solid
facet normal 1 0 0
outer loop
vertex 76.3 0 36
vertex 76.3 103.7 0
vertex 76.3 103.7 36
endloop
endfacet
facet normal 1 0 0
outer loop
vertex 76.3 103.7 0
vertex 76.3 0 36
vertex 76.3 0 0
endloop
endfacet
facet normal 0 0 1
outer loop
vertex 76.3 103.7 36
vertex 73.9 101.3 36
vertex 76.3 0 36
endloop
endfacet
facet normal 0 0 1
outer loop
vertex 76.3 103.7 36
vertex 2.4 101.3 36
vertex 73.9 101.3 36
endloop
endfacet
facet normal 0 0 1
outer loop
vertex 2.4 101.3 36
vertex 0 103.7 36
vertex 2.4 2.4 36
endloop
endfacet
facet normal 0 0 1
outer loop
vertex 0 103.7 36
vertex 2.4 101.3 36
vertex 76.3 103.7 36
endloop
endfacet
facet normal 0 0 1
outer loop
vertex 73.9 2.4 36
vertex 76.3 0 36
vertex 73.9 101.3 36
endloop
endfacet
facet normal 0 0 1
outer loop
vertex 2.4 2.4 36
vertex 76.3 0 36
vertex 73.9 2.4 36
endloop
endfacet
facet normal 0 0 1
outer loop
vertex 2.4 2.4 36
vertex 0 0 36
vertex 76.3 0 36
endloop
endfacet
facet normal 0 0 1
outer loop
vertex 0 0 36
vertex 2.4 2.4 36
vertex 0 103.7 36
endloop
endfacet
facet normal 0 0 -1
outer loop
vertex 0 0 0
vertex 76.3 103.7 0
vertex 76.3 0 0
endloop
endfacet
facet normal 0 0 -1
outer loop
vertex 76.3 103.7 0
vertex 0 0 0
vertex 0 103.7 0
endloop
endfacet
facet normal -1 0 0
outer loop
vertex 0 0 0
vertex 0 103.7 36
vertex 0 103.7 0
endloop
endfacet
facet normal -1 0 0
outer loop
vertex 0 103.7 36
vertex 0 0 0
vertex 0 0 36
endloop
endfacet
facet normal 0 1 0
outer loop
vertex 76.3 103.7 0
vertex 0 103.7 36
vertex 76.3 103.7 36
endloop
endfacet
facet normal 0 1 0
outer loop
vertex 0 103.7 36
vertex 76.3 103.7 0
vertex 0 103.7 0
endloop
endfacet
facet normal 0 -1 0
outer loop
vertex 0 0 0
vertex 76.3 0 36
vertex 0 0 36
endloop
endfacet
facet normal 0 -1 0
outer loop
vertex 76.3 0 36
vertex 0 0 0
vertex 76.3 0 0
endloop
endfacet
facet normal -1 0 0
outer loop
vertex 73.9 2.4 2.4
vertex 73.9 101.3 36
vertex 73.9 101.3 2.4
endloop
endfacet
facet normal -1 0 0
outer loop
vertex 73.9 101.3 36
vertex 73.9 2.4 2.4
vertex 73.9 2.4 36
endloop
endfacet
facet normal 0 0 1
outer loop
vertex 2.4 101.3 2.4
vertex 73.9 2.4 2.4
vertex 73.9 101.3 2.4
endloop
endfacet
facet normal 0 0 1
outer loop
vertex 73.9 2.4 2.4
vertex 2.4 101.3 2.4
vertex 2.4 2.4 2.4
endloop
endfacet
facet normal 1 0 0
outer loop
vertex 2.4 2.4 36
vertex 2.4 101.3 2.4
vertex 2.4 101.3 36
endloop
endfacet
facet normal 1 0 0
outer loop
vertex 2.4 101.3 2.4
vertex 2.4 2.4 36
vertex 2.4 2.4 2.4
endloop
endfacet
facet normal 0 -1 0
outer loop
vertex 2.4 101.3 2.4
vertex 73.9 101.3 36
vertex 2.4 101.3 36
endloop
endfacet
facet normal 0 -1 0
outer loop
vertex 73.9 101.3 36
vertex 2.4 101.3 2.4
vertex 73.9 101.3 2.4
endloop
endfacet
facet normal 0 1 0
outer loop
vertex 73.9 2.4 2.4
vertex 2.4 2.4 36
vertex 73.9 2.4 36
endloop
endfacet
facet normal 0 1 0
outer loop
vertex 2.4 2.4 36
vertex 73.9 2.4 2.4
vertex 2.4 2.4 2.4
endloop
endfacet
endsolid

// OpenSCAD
// Drop-in muck trough. Poker card ~63.5 x 88.9 mm. OpenSCAD.
card_w = 63.5;
card_h = 88.9;
wall = 2.4;
n = 80;
// stack height rough 0.3mm * n
H = 0.3 * n + 12;
W = card_w + 8;
D = card_h + 10;
difference() {
  cube([W + 2*wall, D + 2*wall, H]);
  translate([wall, wall, wall]) cube([W, D, H]);
}
